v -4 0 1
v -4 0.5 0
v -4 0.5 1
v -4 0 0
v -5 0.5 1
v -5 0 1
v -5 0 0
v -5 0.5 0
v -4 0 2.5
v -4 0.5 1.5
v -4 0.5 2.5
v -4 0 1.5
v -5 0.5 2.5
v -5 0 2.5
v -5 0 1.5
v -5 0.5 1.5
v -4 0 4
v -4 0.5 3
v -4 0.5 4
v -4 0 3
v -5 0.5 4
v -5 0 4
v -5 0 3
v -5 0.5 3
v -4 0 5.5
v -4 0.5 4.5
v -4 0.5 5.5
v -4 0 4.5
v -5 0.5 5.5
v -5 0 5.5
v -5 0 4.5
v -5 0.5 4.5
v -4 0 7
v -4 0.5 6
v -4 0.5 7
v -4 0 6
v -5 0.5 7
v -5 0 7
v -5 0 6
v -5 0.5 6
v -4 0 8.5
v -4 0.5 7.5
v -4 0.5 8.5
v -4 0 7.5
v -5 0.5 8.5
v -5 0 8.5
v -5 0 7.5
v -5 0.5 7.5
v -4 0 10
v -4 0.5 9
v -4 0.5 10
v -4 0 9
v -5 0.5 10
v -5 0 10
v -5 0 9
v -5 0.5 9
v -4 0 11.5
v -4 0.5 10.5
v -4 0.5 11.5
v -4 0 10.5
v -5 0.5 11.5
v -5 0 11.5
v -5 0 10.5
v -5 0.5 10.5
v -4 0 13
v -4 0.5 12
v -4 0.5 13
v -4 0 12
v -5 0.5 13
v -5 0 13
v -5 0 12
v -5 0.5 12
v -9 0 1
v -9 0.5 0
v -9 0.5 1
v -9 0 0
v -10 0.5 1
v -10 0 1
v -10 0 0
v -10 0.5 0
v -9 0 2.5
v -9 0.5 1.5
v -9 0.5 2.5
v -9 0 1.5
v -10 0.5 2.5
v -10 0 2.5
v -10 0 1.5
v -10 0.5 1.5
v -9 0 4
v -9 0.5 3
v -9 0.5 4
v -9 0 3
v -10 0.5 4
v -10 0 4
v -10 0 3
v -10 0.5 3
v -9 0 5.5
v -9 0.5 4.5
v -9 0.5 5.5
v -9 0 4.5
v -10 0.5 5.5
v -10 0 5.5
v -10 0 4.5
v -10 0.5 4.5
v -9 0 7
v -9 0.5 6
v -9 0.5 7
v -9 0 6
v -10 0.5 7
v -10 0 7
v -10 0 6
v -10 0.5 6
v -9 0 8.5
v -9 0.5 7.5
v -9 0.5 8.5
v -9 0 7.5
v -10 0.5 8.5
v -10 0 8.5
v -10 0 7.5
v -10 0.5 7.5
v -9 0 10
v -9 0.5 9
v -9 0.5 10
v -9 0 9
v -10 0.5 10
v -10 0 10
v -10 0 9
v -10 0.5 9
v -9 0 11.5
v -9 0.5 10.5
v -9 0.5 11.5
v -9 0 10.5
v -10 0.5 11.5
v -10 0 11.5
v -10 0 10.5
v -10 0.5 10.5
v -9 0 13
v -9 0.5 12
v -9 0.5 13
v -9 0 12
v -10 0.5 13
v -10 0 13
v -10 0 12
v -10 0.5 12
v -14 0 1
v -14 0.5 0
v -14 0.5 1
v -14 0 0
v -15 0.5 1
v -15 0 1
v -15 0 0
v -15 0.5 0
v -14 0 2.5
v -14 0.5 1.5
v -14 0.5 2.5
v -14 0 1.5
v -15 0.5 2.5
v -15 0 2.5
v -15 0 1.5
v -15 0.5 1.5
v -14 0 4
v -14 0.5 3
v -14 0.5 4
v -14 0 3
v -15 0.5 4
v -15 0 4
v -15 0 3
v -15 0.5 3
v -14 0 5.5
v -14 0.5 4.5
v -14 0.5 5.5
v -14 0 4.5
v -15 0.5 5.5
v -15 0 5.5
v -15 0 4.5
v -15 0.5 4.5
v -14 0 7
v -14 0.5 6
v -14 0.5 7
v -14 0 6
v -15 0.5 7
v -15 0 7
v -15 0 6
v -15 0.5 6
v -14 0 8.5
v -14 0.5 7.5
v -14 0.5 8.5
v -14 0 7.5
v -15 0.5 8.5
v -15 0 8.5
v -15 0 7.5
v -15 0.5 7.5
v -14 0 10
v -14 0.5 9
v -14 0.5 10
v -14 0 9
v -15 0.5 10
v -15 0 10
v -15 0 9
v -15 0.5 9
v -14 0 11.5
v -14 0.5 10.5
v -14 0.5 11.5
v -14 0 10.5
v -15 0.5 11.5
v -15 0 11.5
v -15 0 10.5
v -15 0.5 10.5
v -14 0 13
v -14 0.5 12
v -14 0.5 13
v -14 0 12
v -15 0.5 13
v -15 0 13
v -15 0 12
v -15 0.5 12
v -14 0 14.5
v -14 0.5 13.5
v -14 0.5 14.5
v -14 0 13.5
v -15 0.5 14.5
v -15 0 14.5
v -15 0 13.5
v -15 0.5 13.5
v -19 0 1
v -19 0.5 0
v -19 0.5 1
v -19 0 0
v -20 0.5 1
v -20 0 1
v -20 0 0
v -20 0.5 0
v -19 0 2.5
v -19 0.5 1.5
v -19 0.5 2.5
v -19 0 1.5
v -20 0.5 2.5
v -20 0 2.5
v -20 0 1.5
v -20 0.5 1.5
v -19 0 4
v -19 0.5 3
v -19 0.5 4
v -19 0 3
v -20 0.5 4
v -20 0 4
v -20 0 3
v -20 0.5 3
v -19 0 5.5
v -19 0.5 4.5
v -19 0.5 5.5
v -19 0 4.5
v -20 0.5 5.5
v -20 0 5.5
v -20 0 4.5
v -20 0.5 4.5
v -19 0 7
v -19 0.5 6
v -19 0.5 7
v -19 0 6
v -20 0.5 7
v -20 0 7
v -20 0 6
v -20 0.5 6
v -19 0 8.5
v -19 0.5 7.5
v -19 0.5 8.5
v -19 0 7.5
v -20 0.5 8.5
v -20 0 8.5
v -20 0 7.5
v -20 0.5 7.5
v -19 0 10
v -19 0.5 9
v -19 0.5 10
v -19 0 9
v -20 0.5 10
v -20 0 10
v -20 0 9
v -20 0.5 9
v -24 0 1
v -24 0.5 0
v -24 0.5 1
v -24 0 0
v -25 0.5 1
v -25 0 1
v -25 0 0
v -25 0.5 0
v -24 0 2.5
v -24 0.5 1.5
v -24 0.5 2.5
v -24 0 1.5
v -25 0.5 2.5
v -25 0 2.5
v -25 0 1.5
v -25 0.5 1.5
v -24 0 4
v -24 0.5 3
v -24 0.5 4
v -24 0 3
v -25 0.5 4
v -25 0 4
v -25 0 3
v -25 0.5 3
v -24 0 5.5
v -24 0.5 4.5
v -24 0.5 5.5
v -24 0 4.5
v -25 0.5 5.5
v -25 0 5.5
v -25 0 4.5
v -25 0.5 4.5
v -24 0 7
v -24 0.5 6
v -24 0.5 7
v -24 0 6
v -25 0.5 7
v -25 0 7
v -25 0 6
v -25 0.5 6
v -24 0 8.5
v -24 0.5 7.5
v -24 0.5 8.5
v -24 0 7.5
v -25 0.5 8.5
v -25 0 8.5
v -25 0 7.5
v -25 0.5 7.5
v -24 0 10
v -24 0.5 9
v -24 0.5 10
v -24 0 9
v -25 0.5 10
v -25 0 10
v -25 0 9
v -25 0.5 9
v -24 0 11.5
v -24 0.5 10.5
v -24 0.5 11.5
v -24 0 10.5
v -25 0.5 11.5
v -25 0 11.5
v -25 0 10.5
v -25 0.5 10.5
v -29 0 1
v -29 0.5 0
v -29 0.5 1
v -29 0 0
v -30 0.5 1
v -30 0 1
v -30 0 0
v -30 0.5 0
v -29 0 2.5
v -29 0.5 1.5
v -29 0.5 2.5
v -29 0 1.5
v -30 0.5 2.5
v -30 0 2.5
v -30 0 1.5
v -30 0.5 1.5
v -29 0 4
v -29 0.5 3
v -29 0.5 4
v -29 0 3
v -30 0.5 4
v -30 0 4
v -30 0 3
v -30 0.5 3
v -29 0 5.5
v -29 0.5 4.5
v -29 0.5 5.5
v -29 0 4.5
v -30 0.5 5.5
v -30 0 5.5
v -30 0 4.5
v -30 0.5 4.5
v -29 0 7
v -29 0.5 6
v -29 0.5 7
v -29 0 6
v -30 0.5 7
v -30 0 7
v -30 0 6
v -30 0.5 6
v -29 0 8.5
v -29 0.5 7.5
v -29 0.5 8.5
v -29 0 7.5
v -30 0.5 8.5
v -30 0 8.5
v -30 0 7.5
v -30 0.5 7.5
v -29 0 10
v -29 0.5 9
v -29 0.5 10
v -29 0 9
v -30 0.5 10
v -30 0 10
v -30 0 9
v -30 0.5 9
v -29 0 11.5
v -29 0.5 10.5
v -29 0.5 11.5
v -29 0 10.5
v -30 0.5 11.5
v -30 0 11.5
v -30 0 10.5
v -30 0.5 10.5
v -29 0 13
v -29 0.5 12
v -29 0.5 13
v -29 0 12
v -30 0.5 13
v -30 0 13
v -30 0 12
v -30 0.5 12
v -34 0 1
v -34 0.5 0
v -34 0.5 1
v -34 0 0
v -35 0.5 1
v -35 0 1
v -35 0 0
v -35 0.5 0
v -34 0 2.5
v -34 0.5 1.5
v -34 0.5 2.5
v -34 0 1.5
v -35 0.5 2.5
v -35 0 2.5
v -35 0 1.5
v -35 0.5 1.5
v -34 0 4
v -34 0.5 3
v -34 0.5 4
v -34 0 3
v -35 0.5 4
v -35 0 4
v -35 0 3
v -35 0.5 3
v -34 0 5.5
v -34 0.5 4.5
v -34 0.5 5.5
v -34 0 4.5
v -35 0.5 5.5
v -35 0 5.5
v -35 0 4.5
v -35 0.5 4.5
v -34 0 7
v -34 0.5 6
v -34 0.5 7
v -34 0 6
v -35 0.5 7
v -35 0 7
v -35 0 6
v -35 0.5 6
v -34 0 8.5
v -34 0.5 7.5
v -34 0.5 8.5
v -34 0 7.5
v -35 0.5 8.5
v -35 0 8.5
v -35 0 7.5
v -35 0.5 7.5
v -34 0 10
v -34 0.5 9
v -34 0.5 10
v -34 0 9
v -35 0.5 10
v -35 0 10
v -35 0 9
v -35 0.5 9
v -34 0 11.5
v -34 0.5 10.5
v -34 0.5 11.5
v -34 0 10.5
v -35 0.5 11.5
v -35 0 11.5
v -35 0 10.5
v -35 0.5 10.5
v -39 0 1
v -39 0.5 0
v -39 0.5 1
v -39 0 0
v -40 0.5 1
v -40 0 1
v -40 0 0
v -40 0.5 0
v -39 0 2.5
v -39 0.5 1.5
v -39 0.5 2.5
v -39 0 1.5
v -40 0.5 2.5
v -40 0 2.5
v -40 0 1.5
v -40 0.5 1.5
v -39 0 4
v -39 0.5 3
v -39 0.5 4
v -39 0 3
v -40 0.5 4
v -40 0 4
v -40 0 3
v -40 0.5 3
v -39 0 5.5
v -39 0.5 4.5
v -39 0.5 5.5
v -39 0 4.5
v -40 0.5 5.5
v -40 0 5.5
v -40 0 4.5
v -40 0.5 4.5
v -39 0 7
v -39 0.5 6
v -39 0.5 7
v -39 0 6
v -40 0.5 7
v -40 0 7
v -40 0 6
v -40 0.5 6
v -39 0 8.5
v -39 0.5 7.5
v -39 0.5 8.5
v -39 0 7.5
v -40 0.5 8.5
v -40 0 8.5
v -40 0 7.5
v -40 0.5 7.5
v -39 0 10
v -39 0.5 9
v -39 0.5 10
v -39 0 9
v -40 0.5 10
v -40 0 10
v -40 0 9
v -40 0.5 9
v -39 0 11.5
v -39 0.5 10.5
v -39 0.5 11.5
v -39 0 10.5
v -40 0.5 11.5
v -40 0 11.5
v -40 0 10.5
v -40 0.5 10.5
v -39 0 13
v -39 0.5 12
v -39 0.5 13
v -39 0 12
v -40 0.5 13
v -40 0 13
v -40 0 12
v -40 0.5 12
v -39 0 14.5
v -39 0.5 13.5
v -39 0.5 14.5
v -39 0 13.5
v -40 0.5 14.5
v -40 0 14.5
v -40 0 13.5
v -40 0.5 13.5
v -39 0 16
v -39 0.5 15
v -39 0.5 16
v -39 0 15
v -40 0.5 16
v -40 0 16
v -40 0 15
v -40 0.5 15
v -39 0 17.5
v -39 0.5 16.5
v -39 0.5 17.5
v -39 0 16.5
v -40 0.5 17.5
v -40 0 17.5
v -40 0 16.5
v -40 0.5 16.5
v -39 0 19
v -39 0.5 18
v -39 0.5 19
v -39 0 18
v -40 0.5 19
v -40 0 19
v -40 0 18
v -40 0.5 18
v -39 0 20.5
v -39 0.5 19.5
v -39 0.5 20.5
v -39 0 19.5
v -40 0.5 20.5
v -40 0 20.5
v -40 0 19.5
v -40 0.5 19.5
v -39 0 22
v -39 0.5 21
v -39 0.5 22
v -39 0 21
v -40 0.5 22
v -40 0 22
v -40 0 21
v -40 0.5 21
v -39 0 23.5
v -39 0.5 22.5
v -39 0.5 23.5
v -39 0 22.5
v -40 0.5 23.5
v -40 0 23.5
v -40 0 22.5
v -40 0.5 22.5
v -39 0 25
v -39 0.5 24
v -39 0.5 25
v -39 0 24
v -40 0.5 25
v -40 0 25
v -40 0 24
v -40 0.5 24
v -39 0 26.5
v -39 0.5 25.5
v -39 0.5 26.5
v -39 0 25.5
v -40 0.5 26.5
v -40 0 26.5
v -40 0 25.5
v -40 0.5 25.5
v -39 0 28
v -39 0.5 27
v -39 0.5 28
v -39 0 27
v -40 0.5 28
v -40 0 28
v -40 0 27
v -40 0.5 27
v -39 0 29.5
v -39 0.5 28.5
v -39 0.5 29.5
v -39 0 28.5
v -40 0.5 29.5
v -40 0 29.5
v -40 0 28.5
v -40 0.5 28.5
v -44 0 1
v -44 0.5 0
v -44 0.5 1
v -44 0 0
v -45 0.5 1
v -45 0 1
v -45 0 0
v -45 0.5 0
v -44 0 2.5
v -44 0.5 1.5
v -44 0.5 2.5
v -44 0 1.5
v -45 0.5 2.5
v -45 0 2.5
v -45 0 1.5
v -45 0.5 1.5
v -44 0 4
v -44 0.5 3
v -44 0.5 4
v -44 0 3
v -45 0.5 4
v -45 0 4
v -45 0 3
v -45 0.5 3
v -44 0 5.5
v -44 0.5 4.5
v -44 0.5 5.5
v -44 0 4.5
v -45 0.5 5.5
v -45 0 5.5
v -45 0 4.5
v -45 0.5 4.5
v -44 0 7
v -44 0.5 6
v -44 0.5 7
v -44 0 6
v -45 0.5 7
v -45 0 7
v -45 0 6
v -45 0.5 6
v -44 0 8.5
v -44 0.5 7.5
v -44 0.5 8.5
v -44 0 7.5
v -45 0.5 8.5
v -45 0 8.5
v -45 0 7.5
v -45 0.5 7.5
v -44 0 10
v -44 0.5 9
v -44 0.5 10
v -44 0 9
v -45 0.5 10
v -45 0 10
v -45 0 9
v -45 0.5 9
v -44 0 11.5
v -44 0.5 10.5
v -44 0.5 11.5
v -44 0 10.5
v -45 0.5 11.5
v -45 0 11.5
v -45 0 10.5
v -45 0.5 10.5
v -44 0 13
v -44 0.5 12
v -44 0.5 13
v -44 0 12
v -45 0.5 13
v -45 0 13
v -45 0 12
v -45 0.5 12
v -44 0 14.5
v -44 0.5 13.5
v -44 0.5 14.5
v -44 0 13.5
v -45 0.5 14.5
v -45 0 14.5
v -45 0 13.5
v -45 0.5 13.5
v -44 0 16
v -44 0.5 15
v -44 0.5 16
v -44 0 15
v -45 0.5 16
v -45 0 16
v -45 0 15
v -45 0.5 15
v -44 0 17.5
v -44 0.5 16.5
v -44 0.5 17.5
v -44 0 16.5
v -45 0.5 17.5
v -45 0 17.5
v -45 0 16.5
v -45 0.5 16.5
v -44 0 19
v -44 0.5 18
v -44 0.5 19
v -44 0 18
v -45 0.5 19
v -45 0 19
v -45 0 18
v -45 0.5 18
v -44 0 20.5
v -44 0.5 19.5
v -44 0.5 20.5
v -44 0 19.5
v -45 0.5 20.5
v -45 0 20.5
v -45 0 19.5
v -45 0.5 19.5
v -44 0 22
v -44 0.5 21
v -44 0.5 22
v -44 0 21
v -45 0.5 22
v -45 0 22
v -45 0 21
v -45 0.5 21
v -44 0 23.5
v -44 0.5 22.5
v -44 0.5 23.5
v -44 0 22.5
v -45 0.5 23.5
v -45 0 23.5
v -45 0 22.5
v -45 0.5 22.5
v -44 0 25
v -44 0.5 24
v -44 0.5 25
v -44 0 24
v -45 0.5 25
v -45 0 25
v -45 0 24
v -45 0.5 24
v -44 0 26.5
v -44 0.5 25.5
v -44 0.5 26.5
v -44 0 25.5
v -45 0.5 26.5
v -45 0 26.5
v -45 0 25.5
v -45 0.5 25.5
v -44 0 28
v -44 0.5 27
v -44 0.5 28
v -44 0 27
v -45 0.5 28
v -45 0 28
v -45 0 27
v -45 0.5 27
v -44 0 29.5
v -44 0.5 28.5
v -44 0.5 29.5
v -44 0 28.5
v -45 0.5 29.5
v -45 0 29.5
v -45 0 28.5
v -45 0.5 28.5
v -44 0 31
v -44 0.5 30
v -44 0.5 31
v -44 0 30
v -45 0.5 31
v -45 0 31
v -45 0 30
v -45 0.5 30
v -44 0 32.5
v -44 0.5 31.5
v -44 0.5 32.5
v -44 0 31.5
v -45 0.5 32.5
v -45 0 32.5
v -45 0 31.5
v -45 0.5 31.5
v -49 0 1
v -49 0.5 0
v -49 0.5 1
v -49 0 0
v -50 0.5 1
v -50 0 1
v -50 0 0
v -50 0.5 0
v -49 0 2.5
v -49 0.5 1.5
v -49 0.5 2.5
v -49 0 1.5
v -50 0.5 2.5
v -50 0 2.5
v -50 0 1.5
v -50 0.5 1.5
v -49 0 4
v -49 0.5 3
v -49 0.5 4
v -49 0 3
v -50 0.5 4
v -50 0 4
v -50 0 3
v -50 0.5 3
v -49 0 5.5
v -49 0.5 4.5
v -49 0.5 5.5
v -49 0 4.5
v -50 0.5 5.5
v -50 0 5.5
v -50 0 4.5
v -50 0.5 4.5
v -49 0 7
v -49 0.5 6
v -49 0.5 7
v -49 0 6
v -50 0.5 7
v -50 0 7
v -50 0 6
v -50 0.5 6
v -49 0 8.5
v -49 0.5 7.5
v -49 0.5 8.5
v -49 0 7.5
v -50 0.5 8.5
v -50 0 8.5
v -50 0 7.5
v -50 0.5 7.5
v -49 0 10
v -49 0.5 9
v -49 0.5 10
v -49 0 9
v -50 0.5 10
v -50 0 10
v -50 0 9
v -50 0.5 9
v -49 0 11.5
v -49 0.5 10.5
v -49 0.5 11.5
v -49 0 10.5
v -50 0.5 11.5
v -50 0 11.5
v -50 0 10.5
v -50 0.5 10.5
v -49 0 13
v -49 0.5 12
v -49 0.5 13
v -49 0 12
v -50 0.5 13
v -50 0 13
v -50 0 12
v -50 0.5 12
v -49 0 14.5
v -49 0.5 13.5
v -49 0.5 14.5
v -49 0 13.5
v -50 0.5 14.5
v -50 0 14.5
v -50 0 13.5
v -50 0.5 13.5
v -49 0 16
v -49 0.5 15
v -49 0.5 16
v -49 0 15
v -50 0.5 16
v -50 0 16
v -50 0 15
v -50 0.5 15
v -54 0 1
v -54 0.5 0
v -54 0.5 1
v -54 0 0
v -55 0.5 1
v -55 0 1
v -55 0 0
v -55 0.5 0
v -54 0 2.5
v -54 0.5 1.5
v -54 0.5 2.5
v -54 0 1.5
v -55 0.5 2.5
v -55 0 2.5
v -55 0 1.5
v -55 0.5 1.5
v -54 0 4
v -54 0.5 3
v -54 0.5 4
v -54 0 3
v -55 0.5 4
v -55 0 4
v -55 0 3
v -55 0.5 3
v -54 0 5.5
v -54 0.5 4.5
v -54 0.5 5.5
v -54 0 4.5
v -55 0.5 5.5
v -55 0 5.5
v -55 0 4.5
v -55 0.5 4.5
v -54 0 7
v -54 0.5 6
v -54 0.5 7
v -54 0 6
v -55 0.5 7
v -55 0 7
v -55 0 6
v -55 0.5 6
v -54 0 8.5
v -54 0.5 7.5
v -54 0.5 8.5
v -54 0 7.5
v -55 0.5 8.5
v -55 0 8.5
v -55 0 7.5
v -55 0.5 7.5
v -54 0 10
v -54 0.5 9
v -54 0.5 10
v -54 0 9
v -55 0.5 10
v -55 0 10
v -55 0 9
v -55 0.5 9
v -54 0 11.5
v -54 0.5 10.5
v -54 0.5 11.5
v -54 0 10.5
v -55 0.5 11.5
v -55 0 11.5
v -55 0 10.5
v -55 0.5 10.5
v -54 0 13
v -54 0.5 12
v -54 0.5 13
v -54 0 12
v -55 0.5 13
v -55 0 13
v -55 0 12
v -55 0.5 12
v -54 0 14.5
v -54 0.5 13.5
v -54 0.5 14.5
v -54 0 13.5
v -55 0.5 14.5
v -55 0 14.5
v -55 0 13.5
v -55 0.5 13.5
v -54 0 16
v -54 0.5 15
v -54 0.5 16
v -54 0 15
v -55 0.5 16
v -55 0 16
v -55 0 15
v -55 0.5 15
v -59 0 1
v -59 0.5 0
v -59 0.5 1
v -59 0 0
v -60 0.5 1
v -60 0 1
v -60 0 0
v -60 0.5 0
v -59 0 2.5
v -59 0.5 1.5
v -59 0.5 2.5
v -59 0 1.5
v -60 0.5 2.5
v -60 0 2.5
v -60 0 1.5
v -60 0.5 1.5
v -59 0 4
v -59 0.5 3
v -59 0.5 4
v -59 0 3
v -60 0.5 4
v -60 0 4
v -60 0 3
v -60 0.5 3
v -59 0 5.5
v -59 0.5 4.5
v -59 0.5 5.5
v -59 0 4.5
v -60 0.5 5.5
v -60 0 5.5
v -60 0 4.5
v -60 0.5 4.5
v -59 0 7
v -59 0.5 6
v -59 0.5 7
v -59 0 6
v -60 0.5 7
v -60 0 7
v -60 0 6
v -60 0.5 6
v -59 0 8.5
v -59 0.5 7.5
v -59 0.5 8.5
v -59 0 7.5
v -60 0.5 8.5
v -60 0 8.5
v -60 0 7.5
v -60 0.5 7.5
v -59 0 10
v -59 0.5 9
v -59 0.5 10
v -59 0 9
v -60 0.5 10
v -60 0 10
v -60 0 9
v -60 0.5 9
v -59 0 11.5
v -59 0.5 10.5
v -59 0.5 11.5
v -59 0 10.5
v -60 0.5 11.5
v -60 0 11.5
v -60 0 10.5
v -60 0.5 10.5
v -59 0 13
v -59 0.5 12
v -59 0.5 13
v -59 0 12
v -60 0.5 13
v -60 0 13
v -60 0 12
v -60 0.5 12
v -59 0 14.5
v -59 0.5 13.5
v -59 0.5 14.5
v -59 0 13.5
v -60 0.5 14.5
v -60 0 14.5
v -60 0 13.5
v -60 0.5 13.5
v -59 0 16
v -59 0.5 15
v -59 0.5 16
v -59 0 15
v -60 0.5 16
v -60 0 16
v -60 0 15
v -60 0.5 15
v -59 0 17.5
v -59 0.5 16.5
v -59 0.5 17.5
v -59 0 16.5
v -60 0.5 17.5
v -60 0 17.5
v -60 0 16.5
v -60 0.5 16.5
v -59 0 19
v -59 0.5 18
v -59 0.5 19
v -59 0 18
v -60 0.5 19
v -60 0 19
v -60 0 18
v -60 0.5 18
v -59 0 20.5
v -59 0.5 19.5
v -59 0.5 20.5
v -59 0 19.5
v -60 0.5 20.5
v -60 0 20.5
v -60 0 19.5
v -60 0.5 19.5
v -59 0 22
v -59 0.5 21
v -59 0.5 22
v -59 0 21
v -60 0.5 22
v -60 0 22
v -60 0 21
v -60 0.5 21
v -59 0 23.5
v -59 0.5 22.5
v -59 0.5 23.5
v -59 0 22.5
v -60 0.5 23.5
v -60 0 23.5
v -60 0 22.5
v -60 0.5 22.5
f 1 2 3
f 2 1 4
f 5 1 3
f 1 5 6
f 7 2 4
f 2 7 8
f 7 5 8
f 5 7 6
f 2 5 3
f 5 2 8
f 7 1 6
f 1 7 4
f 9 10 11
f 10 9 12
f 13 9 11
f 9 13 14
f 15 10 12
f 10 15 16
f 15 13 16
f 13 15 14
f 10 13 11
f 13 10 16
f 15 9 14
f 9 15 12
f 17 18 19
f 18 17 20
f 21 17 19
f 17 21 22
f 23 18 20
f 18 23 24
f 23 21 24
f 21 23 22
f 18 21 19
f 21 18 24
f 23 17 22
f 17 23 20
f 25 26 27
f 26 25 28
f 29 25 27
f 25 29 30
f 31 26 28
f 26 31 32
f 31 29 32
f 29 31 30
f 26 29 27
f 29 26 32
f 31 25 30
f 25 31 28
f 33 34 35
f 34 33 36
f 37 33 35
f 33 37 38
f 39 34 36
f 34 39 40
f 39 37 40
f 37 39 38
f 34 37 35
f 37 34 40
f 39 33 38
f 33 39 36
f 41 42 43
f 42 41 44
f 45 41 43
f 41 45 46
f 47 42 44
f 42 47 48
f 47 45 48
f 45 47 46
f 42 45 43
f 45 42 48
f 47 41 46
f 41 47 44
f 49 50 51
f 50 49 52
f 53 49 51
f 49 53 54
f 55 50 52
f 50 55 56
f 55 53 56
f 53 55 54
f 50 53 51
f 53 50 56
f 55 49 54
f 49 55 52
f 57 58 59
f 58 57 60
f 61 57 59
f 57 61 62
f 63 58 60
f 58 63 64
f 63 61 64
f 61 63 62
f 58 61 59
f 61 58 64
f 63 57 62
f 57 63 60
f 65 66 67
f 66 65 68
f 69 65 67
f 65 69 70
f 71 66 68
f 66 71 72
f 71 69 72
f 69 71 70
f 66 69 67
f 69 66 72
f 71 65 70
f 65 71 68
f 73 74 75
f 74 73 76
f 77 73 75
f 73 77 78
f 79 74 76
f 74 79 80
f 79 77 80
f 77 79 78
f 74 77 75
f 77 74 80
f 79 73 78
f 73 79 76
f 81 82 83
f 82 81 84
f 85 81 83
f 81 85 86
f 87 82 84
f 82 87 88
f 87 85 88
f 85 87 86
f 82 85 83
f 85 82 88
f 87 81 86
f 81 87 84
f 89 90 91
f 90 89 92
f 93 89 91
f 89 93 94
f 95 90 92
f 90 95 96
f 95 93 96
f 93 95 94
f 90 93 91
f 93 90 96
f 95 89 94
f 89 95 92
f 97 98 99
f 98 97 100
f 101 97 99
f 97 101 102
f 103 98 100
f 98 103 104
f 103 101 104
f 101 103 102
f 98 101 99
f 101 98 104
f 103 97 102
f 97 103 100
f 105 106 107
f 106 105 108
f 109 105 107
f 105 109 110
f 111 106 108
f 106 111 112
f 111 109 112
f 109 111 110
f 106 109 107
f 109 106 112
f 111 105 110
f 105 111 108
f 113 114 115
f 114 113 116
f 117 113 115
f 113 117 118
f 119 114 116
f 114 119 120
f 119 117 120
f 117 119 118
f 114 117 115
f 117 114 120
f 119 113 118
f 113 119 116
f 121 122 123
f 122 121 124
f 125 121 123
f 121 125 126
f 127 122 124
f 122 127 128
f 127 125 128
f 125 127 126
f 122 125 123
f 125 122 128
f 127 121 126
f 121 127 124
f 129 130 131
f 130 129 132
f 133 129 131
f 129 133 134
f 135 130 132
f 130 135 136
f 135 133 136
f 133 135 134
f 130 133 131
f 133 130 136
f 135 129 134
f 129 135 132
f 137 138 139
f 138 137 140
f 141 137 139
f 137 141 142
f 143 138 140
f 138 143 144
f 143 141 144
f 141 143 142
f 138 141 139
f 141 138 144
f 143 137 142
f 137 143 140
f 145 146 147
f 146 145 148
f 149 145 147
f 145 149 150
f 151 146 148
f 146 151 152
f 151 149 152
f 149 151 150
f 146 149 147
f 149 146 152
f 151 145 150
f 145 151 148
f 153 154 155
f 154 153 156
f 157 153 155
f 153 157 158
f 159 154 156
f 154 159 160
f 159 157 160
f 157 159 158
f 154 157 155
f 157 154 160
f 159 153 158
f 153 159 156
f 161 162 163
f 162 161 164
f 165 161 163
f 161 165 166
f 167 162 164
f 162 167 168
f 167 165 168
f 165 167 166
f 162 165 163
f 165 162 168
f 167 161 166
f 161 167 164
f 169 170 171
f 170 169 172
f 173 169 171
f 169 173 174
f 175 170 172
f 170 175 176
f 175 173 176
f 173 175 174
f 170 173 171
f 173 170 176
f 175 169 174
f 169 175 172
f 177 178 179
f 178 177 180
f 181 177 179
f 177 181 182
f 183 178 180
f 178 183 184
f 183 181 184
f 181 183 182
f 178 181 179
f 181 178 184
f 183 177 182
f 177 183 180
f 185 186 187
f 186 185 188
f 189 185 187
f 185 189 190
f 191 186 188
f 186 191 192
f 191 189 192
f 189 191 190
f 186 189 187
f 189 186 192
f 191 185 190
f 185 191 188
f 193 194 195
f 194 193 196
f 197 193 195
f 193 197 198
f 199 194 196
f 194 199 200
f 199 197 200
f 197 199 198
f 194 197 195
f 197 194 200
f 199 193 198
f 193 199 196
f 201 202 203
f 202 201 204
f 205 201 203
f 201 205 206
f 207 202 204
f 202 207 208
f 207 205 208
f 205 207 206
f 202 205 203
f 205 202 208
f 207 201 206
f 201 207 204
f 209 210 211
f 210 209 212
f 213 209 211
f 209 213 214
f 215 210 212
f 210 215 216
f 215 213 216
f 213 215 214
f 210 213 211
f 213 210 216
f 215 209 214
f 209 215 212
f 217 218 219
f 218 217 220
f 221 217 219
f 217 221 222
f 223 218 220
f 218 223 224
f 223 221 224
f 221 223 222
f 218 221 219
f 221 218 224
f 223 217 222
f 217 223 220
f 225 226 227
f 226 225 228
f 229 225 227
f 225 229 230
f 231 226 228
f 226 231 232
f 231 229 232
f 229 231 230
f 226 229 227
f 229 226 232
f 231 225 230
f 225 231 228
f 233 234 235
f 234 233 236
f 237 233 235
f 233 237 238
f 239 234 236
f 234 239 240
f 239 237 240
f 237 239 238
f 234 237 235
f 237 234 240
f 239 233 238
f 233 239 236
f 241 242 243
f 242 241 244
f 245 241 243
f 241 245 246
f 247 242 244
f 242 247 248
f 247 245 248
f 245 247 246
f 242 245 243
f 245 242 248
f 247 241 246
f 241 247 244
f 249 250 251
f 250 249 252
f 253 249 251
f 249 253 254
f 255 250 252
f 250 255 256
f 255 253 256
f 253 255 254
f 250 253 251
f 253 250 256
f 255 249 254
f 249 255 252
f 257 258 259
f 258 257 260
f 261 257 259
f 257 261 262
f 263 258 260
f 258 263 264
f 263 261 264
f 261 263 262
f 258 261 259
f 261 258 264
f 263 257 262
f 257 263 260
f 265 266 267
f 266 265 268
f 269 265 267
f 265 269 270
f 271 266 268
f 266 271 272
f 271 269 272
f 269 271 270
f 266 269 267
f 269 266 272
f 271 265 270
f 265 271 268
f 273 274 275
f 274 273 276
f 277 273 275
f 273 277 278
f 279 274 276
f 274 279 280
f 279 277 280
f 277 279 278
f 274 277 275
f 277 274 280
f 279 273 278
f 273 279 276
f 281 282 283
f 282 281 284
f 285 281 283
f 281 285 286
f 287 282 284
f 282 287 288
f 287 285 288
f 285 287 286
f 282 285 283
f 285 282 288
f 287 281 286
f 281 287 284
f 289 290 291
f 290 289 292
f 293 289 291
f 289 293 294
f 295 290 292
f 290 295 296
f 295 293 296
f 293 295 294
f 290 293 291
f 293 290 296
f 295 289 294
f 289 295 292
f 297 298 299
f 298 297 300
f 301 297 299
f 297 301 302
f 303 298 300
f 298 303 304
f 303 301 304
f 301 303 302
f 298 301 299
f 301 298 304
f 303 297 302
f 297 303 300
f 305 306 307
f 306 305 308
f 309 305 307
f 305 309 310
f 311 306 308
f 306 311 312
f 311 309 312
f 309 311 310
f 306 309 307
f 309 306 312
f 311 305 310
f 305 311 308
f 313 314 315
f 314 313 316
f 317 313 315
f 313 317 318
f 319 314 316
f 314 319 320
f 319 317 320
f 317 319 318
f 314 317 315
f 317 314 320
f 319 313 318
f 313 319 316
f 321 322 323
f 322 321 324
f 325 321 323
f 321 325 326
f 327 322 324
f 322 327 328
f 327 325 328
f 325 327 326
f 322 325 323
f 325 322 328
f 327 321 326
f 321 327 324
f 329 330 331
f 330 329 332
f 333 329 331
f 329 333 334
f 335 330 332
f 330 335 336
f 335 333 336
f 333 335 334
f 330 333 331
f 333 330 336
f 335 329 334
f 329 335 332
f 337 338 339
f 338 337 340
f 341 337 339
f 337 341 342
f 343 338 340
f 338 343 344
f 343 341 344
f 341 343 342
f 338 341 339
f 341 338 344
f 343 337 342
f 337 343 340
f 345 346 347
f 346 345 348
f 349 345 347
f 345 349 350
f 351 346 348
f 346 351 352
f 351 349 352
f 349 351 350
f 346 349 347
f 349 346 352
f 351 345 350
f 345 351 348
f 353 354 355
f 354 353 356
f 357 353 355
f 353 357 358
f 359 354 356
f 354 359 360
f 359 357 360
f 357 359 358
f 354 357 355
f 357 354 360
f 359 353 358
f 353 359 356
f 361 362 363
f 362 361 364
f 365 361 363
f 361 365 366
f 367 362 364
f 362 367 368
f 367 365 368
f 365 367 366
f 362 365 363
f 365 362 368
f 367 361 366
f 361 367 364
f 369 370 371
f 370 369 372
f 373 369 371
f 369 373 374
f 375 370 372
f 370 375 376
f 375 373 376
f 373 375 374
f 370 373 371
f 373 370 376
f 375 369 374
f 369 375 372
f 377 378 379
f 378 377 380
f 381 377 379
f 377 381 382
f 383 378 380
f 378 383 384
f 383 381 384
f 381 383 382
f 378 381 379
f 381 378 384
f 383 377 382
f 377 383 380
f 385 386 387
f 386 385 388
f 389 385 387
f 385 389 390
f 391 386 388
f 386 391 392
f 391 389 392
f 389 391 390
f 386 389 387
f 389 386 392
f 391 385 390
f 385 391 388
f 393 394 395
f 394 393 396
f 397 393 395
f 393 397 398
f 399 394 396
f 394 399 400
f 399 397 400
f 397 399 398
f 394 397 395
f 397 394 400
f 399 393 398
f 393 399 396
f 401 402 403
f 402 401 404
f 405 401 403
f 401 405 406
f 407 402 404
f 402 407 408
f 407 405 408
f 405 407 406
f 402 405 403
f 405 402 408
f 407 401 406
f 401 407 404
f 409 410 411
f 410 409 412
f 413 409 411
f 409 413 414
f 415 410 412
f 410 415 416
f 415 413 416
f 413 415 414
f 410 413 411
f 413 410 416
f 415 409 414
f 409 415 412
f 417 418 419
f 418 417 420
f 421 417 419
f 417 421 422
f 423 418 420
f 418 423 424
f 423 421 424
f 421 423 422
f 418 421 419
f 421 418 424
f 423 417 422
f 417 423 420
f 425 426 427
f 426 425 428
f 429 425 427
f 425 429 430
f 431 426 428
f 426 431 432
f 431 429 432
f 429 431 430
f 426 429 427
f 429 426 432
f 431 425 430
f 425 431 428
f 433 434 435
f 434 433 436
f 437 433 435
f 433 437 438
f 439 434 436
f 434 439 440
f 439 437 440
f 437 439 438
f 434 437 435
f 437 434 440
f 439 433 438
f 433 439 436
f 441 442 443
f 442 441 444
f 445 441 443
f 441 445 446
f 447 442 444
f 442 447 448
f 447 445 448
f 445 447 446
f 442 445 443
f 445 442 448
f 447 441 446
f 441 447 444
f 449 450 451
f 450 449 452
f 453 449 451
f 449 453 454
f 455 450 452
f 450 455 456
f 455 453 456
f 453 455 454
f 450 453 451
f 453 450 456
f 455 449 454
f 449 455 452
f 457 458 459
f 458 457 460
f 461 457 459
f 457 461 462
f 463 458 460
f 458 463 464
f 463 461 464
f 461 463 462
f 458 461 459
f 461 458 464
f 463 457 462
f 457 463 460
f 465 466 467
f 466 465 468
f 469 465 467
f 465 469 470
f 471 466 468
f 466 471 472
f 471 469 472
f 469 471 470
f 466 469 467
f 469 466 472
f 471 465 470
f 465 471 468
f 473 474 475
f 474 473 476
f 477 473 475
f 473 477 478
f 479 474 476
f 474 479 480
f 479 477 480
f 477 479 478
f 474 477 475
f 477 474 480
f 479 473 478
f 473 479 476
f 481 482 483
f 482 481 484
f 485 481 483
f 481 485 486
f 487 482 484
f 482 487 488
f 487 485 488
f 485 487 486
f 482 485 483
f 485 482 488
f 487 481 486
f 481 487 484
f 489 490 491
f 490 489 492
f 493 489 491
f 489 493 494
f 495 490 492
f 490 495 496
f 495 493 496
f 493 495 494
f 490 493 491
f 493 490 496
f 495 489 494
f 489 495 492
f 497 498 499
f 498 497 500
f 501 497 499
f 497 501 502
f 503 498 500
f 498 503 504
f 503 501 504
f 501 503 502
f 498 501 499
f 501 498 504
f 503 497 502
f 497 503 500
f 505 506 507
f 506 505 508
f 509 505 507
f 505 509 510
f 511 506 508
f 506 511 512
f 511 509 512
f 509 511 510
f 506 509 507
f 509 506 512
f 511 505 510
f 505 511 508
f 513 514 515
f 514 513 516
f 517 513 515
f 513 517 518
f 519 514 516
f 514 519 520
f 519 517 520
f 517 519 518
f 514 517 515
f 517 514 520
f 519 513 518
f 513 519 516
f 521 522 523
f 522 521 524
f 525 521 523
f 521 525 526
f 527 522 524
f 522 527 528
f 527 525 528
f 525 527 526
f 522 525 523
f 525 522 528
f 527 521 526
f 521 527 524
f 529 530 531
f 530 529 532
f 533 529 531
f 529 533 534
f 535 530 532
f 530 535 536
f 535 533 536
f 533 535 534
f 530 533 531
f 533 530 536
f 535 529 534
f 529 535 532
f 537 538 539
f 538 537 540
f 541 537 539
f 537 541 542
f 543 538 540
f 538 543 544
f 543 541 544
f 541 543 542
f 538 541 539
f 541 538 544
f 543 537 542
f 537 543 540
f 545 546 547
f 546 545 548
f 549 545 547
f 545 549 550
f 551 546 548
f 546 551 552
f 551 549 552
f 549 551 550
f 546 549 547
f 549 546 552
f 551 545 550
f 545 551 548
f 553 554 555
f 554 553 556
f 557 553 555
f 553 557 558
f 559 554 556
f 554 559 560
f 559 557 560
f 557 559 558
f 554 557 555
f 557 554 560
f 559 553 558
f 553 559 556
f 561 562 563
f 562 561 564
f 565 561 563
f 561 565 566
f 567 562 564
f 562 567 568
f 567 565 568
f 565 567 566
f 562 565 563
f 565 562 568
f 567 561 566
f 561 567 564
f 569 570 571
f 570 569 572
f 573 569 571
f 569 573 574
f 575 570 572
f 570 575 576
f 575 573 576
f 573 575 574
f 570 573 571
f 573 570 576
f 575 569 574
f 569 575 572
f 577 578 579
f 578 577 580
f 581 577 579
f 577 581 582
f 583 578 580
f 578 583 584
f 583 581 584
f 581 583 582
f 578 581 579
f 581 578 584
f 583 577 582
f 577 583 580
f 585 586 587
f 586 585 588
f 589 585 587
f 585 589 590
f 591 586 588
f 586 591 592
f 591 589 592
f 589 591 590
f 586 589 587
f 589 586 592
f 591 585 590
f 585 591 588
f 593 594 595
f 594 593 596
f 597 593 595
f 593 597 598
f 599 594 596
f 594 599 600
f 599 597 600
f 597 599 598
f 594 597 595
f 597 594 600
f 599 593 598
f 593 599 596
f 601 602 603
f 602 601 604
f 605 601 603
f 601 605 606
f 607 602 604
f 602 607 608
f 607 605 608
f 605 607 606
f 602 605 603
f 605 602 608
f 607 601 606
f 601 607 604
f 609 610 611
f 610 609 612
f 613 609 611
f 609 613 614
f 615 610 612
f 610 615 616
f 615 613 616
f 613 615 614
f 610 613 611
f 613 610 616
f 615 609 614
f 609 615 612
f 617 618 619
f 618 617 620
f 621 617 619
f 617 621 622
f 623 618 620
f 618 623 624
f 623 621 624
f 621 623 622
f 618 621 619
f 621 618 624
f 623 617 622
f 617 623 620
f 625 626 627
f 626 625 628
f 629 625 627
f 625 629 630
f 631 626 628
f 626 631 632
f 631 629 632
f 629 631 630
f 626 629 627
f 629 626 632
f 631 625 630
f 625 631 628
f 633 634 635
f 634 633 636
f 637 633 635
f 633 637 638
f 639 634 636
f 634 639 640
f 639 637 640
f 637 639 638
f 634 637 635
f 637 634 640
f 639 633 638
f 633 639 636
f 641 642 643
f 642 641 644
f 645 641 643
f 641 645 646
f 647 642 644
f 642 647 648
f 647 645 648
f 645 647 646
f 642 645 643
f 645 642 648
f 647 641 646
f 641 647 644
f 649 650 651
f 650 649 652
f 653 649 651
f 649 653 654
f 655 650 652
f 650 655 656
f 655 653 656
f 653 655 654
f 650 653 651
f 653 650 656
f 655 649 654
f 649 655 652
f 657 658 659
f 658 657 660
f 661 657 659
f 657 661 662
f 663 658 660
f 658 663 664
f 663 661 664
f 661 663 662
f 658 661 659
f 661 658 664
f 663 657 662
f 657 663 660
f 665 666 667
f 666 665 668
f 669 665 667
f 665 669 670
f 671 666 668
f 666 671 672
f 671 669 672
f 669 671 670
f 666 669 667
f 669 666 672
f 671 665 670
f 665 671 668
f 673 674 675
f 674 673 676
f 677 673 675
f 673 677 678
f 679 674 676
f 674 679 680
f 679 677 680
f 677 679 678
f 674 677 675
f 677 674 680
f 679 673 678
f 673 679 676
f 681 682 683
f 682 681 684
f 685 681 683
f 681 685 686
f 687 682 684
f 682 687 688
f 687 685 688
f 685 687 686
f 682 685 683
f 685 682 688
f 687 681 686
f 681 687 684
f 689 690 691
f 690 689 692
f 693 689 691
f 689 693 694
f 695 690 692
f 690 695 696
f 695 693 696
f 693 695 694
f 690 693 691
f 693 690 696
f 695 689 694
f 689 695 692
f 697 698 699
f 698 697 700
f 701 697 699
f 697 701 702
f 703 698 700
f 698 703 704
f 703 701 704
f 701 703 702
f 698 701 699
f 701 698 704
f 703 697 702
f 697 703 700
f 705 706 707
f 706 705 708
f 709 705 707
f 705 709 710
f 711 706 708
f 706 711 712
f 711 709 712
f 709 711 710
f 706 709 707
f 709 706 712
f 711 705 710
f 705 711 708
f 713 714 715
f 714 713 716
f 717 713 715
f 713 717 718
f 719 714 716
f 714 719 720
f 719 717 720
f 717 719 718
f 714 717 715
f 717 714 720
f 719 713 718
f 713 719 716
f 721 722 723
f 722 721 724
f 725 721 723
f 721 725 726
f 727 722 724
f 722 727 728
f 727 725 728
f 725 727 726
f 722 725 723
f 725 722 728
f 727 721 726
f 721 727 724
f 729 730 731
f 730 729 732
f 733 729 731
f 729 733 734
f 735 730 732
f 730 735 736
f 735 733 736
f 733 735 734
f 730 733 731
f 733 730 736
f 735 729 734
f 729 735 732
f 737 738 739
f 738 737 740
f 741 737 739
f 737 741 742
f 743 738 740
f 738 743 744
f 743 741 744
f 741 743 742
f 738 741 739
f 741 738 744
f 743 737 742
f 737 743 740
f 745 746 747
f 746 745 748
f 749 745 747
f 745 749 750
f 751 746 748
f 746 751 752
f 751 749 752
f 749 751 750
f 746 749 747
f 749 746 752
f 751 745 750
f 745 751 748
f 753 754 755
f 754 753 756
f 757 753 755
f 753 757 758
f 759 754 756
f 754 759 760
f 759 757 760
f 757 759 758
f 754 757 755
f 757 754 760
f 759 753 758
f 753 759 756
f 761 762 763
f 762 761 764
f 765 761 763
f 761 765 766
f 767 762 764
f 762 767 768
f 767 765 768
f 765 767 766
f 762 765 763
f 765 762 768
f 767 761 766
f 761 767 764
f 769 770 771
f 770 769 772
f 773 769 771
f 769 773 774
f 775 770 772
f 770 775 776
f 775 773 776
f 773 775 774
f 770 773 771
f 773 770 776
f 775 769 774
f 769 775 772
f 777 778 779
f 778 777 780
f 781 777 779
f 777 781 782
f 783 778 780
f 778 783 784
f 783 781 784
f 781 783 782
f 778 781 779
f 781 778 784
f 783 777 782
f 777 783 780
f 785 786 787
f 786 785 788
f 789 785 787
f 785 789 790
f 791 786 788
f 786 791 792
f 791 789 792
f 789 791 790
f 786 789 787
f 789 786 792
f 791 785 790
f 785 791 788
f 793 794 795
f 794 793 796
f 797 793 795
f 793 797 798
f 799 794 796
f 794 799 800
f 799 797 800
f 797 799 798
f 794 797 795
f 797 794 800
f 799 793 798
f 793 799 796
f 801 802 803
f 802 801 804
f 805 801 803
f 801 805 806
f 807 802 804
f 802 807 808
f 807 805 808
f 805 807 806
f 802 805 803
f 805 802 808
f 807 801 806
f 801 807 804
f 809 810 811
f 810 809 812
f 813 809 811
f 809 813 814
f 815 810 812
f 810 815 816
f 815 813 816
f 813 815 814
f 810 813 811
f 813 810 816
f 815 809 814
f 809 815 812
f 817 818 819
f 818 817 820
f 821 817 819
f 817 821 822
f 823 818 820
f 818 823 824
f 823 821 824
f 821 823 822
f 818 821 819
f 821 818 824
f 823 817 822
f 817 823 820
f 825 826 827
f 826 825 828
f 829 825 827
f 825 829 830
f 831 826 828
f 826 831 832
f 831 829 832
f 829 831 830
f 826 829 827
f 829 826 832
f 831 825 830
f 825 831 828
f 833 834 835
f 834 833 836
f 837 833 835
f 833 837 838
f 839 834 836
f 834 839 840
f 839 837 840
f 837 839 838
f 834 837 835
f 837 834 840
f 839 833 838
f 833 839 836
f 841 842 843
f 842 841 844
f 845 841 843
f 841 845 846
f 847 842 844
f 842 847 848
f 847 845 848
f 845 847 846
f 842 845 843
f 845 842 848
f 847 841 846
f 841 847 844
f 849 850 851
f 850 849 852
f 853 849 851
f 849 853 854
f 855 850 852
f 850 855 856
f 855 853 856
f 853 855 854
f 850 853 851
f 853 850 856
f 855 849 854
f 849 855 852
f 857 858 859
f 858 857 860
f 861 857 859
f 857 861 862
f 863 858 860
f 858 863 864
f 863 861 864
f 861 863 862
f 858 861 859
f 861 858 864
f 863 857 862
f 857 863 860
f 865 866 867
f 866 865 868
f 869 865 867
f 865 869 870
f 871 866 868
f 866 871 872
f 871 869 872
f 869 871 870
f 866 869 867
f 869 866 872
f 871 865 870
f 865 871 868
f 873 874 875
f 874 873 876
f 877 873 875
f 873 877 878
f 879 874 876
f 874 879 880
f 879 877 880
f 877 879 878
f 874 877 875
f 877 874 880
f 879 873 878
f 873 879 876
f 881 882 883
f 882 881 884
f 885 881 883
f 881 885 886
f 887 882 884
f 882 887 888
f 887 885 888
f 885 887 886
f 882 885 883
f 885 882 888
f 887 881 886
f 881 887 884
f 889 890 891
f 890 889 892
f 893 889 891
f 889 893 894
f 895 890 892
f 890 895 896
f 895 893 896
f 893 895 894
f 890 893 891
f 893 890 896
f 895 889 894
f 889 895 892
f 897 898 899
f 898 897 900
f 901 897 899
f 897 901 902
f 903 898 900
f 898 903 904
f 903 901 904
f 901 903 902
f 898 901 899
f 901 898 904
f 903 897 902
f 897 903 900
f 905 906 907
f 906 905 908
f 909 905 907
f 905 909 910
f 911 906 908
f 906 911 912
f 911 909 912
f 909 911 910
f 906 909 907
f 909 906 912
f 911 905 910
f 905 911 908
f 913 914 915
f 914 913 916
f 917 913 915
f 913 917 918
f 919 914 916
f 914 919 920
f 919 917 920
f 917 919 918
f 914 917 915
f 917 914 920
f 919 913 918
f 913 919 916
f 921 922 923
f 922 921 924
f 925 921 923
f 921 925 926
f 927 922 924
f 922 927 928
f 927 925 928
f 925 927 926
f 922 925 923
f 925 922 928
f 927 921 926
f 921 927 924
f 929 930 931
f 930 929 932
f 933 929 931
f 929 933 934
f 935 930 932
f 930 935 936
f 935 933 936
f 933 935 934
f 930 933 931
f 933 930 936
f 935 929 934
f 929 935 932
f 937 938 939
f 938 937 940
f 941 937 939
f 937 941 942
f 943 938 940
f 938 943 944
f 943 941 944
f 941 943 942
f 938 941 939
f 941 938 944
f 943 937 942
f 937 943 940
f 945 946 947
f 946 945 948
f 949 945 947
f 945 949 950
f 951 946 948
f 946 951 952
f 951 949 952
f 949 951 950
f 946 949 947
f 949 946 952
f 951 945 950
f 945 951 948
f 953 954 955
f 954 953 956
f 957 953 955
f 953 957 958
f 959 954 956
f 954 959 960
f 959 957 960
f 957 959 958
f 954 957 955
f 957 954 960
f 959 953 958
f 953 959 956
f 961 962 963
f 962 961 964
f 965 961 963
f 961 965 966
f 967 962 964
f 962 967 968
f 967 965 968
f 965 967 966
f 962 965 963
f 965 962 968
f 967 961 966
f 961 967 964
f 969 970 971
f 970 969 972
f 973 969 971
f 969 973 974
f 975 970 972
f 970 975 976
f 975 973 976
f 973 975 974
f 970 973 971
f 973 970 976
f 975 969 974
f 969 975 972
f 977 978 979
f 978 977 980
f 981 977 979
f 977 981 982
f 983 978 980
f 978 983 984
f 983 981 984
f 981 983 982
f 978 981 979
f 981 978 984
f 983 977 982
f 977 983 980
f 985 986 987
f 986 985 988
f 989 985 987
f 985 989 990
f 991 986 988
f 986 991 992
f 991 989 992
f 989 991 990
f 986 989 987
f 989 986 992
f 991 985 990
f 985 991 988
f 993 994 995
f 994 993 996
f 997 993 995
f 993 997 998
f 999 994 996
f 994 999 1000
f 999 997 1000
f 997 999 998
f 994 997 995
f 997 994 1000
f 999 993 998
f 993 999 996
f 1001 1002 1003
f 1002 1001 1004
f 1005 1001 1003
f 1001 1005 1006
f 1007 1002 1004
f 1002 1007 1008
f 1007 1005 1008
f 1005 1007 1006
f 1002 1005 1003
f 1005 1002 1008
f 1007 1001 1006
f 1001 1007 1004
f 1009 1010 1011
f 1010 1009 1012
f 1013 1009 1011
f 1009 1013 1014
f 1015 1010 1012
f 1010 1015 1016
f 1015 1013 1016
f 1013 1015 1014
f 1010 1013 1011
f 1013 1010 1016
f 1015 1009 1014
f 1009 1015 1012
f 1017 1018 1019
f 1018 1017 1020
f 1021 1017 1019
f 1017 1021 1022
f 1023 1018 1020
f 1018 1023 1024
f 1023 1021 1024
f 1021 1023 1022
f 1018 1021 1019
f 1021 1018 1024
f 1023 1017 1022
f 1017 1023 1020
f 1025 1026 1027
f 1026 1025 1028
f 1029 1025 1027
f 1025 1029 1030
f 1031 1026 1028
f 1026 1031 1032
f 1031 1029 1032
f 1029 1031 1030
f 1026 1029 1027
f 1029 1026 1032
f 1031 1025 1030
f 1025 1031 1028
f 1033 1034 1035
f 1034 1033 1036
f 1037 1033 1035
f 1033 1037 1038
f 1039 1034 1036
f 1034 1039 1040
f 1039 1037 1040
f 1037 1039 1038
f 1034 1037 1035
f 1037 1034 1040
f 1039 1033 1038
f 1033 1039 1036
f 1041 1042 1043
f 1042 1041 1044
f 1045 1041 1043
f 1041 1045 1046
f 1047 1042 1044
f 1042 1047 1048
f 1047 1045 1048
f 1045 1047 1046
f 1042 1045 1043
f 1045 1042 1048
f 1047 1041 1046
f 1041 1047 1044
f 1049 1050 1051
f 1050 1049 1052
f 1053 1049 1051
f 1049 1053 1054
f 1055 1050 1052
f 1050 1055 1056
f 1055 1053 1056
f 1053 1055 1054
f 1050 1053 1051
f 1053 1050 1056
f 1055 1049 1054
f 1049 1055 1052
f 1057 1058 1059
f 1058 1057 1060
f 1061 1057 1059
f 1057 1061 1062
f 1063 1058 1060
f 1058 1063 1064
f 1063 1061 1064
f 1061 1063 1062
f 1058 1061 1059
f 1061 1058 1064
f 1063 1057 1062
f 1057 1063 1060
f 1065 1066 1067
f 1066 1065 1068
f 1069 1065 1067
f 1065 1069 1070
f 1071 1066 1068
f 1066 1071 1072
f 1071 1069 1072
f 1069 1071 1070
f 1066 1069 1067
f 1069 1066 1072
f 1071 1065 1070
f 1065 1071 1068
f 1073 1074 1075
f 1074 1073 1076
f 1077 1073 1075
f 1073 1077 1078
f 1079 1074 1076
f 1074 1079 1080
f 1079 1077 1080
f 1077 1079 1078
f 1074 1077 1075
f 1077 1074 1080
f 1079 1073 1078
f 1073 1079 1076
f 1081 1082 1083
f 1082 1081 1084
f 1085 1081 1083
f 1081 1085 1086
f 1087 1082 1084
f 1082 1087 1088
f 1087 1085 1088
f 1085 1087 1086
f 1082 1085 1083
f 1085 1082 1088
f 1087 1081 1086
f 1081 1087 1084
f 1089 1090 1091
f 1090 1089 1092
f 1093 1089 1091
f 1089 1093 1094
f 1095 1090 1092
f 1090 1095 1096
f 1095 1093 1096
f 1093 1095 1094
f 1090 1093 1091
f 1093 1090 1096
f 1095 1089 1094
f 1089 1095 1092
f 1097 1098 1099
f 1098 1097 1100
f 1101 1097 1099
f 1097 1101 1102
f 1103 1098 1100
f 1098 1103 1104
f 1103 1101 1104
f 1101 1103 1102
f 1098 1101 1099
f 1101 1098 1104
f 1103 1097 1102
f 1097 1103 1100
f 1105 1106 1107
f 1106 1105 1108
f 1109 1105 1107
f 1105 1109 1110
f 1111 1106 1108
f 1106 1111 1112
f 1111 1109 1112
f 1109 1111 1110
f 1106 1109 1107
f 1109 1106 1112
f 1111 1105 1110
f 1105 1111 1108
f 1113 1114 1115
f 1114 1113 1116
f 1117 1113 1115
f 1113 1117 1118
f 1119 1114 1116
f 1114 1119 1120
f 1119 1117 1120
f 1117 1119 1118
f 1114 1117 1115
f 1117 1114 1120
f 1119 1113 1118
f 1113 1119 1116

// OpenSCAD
// The colors are organized into groups, each group anchored by a simple color
//   (e.g., "Black", or "Red") with additional like colors.
all_colors = [

[
"Black",
"DimGray",
"Gray",
"DarkGray",
"Silver",
"LightGrey",
"DarkSlateGray",
"SlateGray",
"LightSlateGray",
],

[
"Brown",
"RosyBrown",
"SandyBrown",
"Goldenrod",
"DarkGoldenrod",
"Peru",
"Chocolate",
"SaddleBrown",
"Sienna",
],

[
"Tan",
"Cornsilk",
"BlanchedAlmond",
"Bisque",
"NavajoWhite",
"Wheat",
"BurlyWood",
"PapayaWhip",
"Moccasin",
"PeachPuff",
],

[
"Red",
"DarkRed",
"Crimson",
"MediumVioletRed",
"PaleVioletRed",
"IndianRed",
"FireBrick",
],

[
"Pink",
"LightPink",
"HotPink",
"DeepPink",
"Magenta",
"DarkMagenta",
"Maroon",
"Fuchsia",
],

[
"Orange",
"OrangeRed",
"DarkOrange",
"Coral",
"LightCoral",
"Tomato",
"Salmon",
"LightSalmon",
"DarkSalmon",
],

[
"Yellow",
"LightYellow",
"Khaki",
"DarkKhaki",
"LemonChiffon",
"LightGoldenrodYellow",
"PaleGoldenrod",
"Gold",
],

[
"Green",
"LightGreen",
"DarkGreen",
"Olive",
"OliveDrab",
"DarkOliveGreen",
"GreenYellow",
"Chartreuse",
"LawnGreen",
"Lime",
"LimeGreen",
"PaleGreen",
"MediumSpringGreen",
"SpringGreen",
"MediumSeaGreen",
"SeaGreen",
"ForestGreen",
"YellowGreen",
"DarkSeaGreen",
"LightSeaGreen",
],

[
"Blue",
"LightBlue",
"DarkBlue",
"SlateBlue",
"MediumSlateBlue",
"DarkSlateBlue",
"SteelBlue",
"LightSteelBlue",
"CadetBlue",
"PowderBlue",
"SkyBlue",
"LightSkyBlue",
"DeepSkyBlue",
"DodgerBlue",
"CornflowerBlue",
"RoyalBlue",
"MediumBlue",
"Navy",
"MidnightBlue",
"Azure",
"AliceBlue",
"Honeydew",
],

[
"Aqua",
"Aquamarine",
"MediumAquamarine",
"Cyan",
"LightCyan",
"DarkCyan",
"Turquoise",
"PaleTurquoise",
"MediumTurquoise",
"DarkTurquoise",
"Teal",
],

[
"Purple",
"MediumPurple",
"Plum",
"Orchid",
"MediumOrchid",
"DarkOrchid",
"Indigo",
"Violet",
"BlueViolet",
"DarkViolet",
"Thistle",
],

[
"White",
"Snow",
"MintCream",
"GhostWhite",
"WhiteSmoke",
"Seashell",
"Beige",
"OldLace",
"FloralWhite",
"Ivory",
"AntiqueWhite",
"Linen",
"LavenderBlush",
"MistyRose",
"Gainsboro",
"Lavender",
],

];

// Draw a small cube for each color, organized into like columns.
// Label each cube, so it's color can be transferred into the SCAD file.
// Each cube is sxs, with s defaulting to one.
module draw_all_colors(s=1) {
    pitch = s * [-5, 0, 1.5];
    text_offset = s * [1.5, 0, 0.3];
    text_scale = s * 0.03;
    num_groups = len(all_colors);
    for (group_index = [0:num_groups-1]) {
        group = all_colors[group_index];
        num_colors = len(group);
        for (color_index = [0:num_colors-1]) {
            c = group[color_index];
            translate(
                    [pitch.x * (group_index+1),
                     pitch.y * 1,
                     pitch.z * color_index]) {
                color(c)
                    cube([s, 0.5*s, s]);
                color("Black")
                    translate(text_offset)
                        rotate([90, 0, 0])
                            scale(text_scale * [1, 1, 1])
                                text(c);
            }
        }
    }
}

draw_all_colors();
